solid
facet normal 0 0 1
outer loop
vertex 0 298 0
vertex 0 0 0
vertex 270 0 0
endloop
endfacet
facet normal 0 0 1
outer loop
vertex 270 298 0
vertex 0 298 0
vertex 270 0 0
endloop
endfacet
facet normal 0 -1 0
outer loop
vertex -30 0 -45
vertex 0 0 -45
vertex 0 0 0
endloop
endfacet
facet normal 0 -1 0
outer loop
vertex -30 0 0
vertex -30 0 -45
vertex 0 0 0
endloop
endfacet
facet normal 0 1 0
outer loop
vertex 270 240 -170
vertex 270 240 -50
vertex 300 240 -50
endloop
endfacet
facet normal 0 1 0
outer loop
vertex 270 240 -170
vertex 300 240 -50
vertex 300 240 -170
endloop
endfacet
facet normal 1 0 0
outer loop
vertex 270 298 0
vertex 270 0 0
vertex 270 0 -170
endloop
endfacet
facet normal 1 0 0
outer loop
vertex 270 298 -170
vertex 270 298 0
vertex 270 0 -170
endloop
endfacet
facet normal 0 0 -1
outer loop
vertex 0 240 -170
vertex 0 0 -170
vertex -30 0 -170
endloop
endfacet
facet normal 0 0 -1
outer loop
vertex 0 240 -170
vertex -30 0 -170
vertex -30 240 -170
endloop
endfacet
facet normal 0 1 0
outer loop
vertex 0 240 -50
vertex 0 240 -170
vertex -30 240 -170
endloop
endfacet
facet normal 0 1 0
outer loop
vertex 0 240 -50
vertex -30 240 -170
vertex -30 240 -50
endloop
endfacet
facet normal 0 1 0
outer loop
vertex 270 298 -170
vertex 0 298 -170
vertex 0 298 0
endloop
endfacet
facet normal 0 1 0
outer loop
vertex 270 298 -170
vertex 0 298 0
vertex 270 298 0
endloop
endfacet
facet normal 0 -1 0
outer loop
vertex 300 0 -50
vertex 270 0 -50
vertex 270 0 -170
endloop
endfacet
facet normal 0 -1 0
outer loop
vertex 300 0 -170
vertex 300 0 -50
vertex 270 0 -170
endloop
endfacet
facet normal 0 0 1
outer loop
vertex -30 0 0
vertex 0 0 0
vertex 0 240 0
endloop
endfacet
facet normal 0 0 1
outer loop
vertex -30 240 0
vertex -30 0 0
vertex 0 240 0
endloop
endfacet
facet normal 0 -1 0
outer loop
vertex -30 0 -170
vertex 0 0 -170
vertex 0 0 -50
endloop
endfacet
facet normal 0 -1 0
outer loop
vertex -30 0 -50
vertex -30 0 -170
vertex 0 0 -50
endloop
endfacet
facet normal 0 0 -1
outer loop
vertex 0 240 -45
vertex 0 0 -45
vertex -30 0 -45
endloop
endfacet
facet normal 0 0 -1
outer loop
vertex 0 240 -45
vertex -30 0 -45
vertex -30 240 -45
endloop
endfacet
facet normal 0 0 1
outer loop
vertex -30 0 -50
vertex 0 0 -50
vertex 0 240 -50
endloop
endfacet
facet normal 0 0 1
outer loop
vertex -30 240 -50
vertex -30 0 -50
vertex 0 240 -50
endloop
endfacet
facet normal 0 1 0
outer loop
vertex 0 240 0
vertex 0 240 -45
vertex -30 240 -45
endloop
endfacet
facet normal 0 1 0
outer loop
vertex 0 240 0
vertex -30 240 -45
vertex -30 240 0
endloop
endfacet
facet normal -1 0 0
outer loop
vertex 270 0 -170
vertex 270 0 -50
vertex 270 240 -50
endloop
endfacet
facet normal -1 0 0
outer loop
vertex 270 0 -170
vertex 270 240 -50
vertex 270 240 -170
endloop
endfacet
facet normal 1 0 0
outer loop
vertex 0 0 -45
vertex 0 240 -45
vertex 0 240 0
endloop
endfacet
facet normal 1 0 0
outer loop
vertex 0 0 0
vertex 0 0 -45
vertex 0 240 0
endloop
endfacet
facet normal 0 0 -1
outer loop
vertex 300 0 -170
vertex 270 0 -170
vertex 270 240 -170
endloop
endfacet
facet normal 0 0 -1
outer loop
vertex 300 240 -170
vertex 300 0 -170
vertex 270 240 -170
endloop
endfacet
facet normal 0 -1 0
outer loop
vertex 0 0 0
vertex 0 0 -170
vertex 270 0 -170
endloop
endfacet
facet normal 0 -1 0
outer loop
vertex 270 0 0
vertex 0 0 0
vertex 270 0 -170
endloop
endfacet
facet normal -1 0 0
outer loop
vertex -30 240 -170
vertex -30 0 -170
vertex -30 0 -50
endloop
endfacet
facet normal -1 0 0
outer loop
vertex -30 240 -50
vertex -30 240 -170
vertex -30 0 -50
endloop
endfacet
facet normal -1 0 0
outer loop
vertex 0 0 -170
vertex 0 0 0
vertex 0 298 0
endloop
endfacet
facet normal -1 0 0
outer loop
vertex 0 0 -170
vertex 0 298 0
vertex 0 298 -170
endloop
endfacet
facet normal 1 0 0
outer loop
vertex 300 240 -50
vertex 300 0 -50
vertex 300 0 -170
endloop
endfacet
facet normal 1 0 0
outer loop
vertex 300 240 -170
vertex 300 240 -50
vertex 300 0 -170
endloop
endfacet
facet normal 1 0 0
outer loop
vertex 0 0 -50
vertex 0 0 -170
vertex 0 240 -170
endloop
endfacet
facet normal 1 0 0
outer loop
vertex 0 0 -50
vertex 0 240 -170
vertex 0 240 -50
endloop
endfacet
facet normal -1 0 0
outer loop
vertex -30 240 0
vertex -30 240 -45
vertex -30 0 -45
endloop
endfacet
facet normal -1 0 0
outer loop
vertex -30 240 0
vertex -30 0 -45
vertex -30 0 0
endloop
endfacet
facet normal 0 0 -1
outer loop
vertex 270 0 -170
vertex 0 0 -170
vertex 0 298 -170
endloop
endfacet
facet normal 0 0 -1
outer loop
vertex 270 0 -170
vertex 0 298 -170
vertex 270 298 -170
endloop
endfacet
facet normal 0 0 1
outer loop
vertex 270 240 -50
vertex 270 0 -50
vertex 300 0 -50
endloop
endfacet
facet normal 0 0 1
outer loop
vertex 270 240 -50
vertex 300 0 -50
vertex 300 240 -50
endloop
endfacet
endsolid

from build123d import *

# Parameters (mm, degrees)
SKETCH1_W             = 270
SKETCH1_H             = 170
BOSS_EXTRUDE1_DEPTH   = 298
SKETCH2_W             = 120
SKETCH2_H             = 240
BOSS_EXTRUDE2_DEPTH   = 30
SKETCH2_W_2           = 45
BOSS_EXTRUDE2_2_DEPTH = 30
SKETCH3_W             = 120
SKETCH3_H             = 240
BOSS_EXTRUDE3_DEPTH   = 30


with BuildPart() as part:
    # Sketch1 → Boss-Extrude1 (new body)
    with BuildSketch(Plane(origin=(0, 0, 0), x_dir=(1, 0, 0), z_dir=(0, 1, 0))):
        with Locations((135, 85)):
            Rectangle(SKETCH1_W, SKETCH1_H)
    extrude(amount=BOSS_EXTRUDE1_DEPTH)


with BuildPart() as body_2:
    # Sketch2 → Boss-Extrude2 (new body)
    with BuildSketch(Plane.ZY):
        with Locations((-110, 120)):
            Rectangle(SKETCH2_W, SKETCH2_H)
    extrude(amount=BOSS_EXTRUDE2_DEPTH)


with BuildPart() as body_3:
    # Sketch2 → Boss-Extrude2 2 (new body)
    with BuildSketch(Plane.ZY):
        with Locations((-22.5, 120)):
            Rectangle(SKETCH2_W_2, SKETCH2_H)
    extrude(amount=BOSS_EXTRUDE2_2_DEPTH)


with BuildPart() as body_4:
    # Sketch3 → Boss-Extrude3 (new body)
    with BuildSketch(Plane(origin=(270, 0, 0), x_dir=(0, 0, -1), z_dir=(1, 0, 0))):
        with Locations((110, 120)):
            Rectangle(SKETCH3_W, SKETCH3_H)
    extrude(amount=BOSS_EXTRUDE3_DEPTH)


solid = Compound([part.part, body_2.part, body_3.part, body_4.part])
